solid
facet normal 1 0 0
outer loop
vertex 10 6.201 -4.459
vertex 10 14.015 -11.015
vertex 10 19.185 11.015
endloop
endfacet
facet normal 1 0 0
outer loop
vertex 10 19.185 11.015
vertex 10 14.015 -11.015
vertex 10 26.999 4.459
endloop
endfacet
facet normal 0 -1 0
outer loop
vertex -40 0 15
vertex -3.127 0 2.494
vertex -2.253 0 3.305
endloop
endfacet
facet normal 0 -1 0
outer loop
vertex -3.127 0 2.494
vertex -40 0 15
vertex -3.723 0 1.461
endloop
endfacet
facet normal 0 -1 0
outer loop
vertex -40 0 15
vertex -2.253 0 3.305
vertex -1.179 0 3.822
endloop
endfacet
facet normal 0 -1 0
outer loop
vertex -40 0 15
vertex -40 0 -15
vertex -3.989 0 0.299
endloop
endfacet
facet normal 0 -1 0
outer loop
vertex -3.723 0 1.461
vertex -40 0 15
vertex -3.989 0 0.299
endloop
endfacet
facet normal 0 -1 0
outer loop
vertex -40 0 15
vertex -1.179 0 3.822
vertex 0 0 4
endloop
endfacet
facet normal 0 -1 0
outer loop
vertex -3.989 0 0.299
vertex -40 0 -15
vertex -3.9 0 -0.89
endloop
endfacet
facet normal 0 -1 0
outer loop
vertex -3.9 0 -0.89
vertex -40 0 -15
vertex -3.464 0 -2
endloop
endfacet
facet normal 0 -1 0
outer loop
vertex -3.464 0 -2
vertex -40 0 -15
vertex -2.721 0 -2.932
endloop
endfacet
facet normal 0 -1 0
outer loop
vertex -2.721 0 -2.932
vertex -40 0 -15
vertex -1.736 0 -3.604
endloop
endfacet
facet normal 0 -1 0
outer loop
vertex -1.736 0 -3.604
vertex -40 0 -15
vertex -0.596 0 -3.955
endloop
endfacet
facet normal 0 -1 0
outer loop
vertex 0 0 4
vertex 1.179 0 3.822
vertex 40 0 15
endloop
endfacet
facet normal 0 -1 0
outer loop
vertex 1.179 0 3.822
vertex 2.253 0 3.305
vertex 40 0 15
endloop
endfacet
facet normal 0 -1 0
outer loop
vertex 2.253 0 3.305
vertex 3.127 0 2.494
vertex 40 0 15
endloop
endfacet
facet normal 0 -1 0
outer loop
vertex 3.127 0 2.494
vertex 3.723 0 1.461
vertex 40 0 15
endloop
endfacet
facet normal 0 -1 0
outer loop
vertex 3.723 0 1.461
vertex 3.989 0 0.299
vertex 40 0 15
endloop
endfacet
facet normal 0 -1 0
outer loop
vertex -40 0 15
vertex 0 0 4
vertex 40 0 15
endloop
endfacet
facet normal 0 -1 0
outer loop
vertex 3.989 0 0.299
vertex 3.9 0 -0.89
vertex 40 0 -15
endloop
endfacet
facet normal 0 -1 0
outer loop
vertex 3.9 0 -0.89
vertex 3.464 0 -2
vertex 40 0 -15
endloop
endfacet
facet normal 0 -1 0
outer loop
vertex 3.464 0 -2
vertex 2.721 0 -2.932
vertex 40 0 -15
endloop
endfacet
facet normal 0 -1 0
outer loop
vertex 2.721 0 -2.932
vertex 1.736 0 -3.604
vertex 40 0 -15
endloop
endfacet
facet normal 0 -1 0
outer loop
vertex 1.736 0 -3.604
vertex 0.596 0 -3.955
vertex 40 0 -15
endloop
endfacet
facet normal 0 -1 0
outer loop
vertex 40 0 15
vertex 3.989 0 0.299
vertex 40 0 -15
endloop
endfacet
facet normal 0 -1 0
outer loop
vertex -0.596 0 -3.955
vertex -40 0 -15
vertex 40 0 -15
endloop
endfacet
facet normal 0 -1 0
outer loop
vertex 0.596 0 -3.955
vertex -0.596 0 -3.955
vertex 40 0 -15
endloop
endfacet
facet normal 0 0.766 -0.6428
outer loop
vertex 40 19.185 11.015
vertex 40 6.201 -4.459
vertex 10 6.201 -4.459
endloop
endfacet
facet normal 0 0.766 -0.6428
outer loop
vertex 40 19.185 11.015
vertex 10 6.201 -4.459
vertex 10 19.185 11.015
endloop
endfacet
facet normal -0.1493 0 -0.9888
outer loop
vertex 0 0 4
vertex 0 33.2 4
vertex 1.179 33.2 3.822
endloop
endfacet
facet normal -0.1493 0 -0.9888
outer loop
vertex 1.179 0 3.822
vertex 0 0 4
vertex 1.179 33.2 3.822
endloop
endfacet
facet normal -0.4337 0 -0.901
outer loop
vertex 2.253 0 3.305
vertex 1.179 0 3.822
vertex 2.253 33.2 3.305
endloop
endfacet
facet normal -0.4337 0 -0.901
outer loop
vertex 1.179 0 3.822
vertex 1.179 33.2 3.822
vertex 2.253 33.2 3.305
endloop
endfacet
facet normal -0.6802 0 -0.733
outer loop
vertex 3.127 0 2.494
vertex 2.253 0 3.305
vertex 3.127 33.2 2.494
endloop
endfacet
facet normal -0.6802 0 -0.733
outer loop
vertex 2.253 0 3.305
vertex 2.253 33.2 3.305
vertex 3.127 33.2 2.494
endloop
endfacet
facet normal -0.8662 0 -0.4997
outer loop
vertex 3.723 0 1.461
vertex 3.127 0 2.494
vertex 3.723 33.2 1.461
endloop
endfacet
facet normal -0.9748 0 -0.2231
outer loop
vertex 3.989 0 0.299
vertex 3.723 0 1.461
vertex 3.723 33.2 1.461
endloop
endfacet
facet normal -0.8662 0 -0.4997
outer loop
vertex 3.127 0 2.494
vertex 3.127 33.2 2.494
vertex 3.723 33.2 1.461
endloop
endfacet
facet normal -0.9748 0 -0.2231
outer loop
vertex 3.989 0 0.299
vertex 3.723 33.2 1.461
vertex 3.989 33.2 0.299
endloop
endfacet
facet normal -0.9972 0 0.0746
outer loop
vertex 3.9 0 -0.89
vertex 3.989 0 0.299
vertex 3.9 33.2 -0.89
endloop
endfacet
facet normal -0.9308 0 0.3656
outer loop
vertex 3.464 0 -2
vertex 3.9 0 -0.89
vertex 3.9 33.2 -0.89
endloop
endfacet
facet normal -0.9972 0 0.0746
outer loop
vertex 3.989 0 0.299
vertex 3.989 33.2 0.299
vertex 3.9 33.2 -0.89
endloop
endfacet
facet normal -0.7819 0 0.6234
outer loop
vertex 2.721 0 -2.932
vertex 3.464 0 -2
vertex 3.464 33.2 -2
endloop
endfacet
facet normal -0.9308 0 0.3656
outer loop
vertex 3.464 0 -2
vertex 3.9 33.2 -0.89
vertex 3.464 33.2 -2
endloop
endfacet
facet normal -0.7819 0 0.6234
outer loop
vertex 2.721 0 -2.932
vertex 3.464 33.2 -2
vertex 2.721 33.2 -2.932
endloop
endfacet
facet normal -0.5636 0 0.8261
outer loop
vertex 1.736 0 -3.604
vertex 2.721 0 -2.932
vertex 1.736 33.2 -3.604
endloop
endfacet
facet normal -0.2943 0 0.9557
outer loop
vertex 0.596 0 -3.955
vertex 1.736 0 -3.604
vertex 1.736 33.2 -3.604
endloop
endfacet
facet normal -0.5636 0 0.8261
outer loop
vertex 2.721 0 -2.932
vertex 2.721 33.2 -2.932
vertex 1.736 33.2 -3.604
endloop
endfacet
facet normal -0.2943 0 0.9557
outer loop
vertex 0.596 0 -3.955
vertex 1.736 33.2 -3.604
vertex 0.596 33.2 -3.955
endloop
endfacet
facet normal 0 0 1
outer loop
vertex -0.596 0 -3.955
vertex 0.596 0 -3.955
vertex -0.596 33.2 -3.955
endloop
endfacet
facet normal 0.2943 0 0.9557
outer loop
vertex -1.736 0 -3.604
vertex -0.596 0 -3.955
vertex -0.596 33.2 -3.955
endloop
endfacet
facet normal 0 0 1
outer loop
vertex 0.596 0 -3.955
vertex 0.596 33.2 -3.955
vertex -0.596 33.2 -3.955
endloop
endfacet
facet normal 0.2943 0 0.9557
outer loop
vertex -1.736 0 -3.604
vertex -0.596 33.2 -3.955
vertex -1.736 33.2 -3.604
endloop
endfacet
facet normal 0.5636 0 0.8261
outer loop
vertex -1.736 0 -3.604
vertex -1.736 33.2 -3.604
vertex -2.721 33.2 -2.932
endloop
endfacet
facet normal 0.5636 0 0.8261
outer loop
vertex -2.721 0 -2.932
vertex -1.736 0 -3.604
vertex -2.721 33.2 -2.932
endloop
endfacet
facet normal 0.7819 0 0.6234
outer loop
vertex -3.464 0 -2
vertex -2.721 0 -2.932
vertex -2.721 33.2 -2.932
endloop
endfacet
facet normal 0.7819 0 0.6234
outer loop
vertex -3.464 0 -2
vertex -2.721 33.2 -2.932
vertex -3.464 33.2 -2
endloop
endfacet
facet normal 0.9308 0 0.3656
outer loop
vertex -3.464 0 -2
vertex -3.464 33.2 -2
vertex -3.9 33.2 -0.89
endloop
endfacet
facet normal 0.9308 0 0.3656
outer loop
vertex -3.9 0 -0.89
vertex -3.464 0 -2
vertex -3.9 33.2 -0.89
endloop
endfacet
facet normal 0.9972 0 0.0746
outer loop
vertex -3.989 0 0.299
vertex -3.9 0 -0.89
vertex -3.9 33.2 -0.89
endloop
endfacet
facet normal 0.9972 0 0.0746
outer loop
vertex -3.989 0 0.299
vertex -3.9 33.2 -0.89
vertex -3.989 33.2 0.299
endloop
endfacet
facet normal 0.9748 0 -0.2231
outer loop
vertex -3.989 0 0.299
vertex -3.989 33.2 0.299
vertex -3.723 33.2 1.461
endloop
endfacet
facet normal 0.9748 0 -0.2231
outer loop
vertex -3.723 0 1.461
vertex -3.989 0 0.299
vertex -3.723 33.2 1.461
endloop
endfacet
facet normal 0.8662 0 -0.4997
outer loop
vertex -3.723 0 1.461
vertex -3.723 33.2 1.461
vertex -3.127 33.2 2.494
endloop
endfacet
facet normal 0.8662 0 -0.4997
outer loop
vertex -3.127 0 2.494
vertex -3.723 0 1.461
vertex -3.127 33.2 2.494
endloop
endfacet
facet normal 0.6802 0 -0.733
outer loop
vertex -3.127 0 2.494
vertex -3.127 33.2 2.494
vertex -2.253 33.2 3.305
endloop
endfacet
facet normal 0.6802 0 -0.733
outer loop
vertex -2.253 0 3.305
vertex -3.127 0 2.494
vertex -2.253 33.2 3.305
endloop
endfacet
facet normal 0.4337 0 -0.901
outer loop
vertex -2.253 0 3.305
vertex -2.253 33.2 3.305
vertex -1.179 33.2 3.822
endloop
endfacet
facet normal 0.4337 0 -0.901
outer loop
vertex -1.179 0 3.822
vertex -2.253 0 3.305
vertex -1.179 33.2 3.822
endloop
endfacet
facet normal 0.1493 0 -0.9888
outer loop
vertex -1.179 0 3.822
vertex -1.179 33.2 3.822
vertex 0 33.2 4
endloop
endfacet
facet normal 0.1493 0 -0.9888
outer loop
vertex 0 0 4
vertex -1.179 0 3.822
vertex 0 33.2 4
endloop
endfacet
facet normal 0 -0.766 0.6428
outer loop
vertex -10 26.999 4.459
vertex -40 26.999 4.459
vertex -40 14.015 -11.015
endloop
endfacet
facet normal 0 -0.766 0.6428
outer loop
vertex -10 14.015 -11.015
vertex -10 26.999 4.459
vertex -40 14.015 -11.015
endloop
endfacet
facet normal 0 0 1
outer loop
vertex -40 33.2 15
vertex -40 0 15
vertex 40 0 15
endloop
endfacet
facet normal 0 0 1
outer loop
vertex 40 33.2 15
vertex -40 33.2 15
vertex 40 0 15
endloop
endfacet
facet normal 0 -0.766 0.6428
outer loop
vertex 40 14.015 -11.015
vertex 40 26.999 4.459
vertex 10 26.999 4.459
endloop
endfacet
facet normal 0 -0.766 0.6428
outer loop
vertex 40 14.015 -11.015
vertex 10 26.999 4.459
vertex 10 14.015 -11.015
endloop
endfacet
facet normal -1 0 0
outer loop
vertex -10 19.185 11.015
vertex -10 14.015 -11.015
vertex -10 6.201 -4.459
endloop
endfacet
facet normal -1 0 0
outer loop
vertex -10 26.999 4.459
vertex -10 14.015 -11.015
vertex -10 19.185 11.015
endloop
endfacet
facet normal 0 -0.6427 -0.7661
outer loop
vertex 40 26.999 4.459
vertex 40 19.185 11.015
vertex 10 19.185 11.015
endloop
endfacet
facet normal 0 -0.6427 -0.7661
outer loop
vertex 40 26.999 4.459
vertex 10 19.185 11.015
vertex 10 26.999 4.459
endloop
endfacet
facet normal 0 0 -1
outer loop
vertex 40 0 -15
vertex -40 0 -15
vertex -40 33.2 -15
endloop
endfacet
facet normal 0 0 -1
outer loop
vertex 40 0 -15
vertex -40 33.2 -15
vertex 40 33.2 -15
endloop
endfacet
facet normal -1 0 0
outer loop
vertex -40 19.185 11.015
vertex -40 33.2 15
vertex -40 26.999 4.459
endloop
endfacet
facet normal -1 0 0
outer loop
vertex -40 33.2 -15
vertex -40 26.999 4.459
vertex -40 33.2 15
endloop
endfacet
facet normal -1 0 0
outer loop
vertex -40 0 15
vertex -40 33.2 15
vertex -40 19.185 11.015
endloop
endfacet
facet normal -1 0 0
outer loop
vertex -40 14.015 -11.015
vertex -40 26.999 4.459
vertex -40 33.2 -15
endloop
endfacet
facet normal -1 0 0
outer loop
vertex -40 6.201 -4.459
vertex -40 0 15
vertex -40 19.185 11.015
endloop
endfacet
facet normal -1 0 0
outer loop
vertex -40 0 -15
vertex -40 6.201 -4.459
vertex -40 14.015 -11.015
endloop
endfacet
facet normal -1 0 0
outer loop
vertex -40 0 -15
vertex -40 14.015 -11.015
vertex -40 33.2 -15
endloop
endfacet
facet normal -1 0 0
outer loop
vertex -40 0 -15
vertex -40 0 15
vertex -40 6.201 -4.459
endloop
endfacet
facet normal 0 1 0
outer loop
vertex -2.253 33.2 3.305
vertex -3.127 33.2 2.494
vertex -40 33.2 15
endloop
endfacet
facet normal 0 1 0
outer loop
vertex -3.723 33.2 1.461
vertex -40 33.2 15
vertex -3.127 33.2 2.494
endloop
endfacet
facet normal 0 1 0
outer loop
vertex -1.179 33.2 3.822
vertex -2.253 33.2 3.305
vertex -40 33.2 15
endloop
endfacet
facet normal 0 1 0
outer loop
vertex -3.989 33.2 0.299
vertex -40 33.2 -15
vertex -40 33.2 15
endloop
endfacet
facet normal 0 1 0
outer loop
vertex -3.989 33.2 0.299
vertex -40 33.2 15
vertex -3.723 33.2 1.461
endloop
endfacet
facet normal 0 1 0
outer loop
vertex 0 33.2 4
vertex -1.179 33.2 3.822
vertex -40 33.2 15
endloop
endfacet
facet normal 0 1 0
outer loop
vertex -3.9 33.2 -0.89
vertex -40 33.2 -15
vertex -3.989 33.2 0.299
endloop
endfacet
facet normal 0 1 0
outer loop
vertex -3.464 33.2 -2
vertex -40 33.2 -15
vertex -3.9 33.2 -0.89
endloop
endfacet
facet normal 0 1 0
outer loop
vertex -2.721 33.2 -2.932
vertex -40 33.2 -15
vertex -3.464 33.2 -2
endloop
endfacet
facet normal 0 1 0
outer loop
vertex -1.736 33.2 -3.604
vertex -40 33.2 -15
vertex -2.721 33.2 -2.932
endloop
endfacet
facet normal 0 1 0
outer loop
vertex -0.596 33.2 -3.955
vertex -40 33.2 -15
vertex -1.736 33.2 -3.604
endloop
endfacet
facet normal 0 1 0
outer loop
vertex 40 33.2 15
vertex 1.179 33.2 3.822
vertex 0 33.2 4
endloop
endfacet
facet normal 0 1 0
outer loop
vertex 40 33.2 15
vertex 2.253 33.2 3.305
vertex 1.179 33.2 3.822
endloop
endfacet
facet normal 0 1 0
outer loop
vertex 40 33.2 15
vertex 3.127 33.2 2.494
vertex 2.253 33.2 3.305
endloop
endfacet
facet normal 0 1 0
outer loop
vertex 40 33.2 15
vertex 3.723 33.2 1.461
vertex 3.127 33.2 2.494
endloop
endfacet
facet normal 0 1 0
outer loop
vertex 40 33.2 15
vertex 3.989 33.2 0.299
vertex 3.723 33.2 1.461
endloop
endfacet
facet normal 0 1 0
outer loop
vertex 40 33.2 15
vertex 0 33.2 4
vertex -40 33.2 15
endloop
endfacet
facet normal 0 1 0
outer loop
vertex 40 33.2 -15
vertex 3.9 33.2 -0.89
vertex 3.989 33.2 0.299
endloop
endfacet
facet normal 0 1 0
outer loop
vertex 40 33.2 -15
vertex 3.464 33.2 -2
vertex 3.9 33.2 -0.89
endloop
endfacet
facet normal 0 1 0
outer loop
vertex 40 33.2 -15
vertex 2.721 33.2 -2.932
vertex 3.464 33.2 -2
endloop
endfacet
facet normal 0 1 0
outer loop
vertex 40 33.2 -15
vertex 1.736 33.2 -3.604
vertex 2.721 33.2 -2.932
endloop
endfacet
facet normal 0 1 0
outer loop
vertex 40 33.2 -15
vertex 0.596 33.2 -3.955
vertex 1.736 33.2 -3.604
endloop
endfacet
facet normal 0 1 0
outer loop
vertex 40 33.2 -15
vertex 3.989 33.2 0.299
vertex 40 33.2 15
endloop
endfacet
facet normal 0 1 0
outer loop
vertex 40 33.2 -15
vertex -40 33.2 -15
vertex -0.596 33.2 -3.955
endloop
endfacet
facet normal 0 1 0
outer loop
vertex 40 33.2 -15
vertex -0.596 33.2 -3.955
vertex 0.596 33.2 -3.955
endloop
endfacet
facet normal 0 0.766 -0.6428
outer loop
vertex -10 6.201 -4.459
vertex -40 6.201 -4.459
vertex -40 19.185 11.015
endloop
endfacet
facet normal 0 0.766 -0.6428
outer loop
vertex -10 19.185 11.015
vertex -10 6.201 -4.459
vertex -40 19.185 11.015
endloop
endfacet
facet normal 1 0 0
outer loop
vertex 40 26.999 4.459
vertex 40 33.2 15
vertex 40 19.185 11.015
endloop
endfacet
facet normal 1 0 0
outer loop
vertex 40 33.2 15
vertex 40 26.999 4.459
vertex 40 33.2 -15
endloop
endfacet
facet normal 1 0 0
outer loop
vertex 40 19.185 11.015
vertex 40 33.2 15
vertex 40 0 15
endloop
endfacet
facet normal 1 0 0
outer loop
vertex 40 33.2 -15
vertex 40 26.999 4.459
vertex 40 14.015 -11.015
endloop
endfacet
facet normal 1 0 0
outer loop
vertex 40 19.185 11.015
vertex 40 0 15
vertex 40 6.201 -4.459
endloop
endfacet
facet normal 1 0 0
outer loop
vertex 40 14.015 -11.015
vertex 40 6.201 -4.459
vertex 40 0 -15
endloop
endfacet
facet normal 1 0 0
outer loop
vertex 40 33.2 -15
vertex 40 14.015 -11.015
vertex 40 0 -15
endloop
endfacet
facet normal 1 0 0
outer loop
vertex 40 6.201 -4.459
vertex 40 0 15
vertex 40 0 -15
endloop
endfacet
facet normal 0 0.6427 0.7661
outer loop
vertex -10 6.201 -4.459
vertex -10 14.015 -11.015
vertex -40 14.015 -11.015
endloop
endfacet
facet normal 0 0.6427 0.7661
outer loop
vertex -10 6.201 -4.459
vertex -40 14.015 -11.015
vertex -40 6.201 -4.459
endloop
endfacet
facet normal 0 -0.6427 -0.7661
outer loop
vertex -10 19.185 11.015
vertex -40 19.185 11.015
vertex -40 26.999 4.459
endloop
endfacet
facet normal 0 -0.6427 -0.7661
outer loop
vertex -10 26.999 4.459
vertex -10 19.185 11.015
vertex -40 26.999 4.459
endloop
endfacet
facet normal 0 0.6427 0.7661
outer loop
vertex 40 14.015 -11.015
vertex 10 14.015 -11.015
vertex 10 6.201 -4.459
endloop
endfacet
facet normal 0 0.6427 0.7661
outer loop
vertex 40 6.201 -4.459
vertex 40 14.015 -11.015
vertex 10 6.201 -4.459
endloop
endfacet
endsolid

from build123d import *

# Parameters (mm, degrees)
SKETCH_1_W          = 80
SKETCH_1_H          = 30
EXTRUDE_1_DEPTH     = 33.2
SKETCH_2_R          = 4
CUT_EXTRUDE_1_DEPTH = 34.2
CUT_EXTRUDE_4_DEPTH = 30
CUT_EXTRUDE_5_DEPTH = 30


with BuildPart() as part:
    # Эскиз1 → Бобышка-Вытянуть1 (new body)
    with BuildSketch(Plane(origin=(0, 0, 0), x_dir=(1, 0, 0), z_dir=(0, 1, 0))):
        Rectangle(SKETCH_1_W, SKETCH_1_H)
    extrude(amount=EXTRUDE_1_DEPTH)

    # Эскиз2 → Вырез-Вытянуть1 (cut, through all)
    with BuildSketch(Plane(origin=(0, 33.2, 0), x_dir=(1, 0, 0), z_dir=(0, 1, 0))):
        with Locations(Location((0, 0, 0), (0, 0, 270))):  # turned: the seam where the file's is
            Circle(SKETCH_2_R)
    extrude(amount=-CUT_EXTRUDE_1_DEPTH, mode=Mode.SUBTRACT)

    # Эскиз5 → Вырез-Вытянуть4 (cut)
    with BuildSketch(Plane.ZY.offset(40)):
        Polygon((-11.015265685, 14.014671802), (-4.458832066, 6.201018482), (11.015265685, 19.185328198), (4.458832066, 26.998981518), align=None)
    extrude(amount=-CUT_EXTRUDE_4_DEPTH, mode=Mode.SUBTRACT)

    # Эскиз6 → Вырез-Вытянуть5 (cut)
    with BuildSketch(Plane(origin=(40, 0, 0), x_dir=(0, 0, -1), z_dir=(1, 0, 0))):
        Polygon((11.015265685, 14.014671802), (4.458832066, 6.201018482), (-11.015265685, 19.185328198), (-4.458832066, 26.998981518), align=None)
    extrude(amount=-CUT_EXTRUDE_5_DEPTH, mode=Mode.SUBTRACT)


solid = part.part
